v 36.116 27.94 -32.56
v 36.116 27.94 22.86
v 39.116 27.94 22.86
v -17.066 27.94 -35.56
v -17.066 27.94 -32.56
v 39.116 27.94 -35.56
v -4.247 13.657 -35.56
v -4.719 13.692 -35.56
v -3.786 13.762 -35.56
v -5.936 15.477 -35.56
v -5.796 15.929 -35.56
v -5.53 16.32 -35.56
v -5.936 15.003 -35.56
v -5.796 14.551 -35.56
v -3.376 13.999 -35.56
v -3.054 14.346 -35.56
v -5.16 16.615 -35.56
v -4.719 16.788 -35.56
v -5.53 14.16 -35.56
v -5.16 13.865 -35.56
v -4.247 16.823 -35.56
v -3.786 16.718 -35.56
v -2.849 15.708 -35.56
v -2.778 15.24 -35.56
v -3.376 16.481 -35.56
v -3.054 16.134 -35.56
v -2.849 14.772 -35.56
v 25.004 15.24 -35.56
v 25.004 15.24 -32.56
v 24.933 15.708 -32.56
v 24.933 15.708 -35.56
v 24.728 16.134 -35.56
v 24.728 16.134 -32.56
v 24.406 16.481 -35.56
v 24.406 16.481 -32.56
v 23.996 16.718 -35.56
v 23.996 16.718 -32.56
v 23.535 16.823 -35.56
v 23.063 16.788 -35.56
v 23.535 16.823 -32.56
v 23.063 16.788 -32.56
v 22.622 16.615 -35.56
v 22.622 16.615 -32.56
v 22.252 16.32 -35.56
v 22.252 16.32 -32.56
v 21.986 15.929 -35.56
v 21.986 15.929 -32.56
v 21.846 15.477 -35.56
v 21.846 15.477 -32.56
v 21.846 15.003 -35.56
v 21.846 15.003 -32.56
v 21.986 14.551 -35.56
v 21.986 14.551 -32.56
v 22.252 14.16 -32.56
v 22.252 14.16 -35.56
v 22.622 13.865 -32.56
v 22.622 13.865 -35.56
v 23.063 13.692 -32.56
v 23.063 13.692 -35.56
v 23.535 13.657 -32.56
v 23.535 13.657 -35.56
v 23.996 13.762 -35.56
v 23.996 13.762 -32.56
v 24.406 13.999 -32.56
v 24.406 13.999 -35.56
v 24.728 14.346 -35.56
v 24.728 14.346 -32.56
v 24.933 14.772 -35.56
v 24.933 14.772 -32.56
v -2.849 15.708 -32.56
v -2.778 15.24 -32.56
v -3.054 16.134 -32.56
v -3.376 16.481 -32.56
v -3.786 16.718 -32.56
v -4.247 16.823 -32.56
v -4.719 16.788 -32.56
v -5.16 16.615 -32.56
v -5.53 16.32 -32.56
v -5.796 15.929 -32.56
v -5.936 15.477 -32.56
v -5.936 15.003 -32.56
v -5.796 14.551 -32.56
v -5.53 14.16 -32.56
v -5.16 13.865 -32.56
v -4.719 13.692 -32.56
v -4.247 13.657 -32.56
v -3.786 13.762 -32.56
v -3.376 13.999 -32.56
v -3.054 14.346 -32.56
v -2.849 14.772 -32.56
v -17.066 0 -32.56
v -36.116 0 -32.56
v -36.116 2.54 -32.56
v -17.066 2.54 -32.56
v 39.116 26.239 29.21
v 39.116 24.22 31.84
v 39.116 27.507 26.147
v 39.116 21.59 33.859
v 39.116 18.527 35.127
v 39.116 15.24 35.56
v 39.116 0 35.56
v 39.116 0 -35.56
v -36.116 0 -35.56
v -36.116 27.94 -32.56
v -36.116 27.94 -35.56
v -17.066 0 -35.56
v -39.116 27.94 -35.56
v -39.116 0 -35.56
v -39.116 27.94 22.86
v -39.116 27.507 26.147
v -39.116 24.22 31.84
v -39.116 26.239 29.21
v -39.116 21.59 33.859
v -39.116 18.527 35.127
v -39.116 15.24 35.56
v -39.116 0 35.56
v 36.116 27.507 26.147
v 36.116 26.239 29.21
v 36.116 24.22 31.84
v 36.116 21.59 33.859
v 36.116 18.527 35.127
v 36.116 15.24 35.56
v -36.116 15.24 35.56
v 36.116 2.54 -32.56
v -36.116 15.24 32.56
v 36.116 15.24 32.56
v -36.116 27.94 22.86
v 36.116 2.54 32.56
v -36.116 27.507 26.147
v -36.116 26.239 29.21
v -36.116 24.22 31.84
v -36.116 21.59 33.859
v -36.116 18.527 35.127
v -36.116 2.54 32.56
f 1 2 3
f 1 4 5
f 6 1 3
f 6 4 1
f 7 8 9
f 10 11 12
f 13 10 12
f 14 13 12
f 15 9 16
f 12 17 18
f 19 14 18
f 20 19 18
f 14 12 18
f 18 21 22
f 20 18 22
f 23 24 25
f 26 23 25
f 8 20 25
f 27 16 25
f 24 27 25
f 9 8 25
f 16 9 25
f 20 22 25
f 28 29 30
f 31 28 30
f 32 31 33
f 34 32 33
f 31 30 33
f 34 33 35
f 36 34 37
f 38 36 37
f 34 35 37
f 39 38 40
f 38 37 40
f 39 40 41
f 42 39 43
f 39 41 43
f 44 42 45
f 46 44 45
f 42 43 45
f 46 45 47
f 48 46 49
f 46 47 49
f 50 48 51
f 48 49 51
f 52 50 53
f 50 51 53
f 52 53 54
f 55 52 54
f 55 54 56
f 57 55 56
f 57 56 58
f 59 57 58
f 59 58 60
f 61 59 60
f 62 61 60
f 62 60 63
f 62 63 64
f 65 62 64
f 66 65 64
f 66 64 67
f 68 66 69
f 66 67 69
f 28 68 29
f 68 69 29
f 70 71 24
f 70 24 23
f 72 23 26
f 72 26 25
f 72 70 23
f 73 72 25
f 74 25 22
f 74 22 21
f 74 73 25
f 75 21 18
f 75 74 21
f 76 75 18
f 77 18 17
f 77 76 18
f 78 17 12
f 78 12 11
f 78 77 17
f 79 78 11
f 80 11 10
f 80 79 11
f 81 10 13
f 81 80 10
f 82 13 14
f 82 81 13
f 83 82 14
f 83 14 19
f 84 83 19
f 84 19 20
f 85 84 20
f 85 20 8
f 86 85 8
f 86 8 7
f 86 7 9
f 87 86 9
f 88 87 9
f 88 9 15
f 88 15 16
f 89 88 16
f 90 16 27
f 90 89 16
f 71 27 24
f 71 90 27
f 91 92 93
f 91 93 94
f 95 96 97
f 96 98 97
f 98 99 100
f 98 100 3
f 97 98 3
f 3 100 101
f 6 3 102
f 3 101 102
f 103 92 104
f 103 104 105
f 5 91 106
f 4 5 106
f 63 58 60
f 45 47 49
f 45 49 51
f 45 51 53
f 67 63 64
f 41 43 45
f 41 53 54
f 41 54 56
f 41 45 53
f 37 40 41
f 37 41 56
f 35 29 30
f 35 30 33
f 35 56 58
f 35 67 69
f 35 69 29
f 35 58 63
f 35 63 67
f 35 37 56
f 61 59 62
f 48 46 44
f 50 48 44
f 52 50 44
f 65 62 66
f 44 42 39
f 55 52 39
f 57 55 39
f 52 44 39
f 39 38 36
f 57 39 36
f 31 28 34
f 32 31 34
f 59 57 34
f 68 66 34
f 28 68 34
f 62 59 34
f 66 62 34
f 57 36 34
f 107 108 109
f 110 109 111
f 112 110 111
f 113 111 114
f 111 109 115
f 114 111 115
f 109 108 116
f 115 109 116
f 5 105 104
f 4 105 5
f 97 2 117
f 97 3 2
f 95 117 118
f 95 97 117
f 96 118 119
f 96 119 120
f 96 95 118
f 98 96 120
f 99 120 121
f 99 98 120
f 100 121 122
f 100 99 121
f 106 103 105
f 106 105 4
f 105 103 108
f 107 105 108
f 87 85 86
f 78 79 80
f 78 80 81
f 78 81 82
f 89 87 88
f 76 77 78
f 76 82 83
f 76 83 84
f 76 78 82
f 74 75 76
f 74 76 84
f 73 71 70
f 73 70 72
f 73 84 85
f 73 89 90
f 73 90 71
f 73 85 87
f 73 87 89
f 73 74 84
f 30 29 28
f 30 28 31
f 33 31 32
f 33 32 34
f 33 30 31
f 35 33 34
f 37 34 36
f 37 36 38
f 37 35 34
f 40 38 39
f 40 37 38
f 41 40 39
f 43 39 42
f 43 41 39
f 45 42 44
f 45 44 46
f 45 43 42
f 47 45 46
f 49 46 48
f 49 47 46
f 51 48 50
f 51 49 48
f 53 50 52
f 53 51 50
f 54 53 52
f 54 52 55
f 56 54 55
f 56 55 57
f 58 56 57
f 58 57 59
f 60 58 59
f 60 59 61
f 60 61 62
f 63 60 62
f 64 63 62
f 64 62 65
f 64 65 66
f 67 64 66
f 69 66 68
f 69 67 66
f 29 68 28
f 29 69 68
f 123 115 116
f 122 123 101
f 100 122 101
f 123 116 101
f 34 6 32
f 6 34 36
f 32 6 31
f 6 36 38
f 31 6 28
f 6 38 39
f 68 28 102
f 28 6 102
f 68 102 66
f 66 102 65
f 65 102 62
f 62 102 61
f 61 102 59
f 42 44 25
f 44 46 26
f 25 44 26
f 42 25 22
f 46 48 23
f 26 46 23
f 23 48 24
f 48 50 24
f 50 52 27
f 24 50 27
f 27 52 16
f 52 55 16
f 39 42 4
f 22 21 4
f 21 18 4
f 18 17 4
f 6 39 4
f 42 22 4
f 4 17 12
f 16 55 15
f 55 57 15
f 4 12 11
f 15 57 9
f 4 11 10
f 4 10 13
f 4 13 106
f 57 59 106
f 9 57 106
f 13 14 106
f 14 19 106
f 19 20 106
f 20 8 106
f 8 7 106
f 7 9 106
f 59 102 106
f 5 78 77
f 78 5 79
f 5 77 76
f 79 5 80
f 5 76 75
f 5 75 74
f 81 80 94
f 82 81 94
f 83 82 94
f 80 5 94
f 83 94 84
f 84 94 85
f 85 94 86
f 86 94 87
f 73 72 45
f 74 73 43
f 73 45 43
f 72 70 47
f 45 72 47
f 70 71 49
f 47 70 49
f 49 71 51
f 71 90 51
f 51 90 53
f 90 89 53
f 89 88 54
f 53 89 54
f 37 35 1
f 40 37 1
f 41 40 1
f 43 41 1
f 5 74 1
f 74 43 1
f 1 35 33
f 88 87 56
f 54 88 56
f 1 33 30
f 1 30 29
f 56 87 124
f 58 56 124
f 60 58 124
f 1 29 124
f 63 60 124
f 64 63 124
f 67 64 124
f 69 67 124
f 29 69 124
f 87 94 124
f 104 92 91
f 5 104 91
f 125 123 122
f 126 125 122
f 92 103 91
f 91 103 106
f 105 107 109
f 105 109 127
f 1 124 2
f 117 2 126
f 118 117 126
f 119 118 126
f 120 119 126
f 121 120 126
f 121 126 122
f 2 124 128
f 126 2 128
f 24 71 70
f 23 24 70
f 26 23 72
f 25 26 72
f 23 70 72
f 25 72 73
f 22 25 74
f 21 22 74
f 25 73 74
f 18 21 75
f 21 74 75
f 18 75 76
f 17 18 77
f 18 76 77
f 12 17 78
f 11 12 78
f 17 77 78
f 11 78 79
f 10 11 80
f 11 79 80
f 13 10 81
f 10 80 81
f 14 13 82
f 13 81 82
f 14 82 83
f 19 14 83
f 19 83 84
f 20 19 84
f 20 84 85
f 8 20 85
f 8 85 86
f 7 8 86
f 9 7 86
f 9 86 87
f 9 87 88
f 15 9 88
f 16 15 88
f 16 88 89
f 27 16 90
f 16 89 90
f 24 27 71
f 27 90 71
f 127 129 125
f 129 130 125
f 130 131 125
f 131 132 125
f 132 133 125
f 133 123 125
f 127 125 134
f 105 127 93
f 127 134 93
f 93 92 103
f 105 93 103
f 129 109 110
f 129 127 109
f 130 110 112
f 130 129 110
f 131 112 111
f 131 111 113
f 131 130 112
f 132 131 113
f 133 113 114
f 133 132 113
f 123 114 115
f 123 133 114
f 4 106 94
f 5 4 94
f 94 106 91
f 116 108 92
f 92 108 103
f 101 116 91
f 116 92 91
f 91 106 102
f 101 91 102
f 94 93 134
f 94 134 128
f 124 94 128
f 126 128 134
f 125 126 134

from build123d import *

# Parameters (mm, degrees)
SKETCH1_W             = 72.232
SKETCH1_H             = 65.12
BOSS_EXTRUDE1_DEPTH   = 2.54
BOSS_EXTRUDE2_DEPTH   = 27.94
SKETCH1_4_W           = 19.05
SKETCH1_4_H           = 3
BOSS_EXTRUDE3_DEPTH   = 27.94
SKETCH2_W             = 72.232
SKETCH2_H             = 12.7
CUT_EXTRUDE1_DEPTH    = 27.94
FILLET1_R             = 12.7
SKETCH3_R             = 1.5875
CUT_EXTRUDE2_DEPTH    = 3
SKETCH3_2_R           = 1.5875
BOSS_EXTRUDE4_DEPTH   = 3
BOSS_EXTRUDE4_2_DEPTH = 3


with BuildPart() as part:
    # Sketch1 → Boss-Extrude1 (new body)
    with BuildSketch(Plane(origin=(0, 0, 0), x_dir=(1, 0, 0), z_dir=(0, 1, 0))):
        Rectangle(SKETCH1_W, SKETCH1_H)
    extrude(amount=BOSS_EXTRUDE1_DEPTH)

    # Sketch1<3> → Boss-Extrude2 (add)
    with BuildSketch(Plane(origin=(0, 0, 0), x_dir=(1, 0, 0), z_dir=(0, 1, 0))):
        Polygon((-36.116, -32.56), (-36.116, 32.56), (-36.116, 35.56), (-39.116, 35.56), (-39.116, -35.56), (39.116, -35.56), (39.116, 35.56), (-17.066, 35.56), (-17.066, 32.56), (36.116, 32.56), (36.116, -32.56), align=None)
    extrude(amount=BOSS_EXTRUDE2_DEPTH)

    # Sketch2 → Cut-Extrude1 (cut)
    with BuildSketch(Plane.XY.offset(35.56)):
        with Locations((0, 21.59)):
            Rectangle(SKETCH2_W, SKETCH2_H)
    extrude(amount=-CUT_EXTRUDE1_DEPTH, mode=Mode.SUBTRACT)

    # Fillet1
    fillet1_edges = [part.edges().sort_by_distance(p)[0] for p in [
        (-37.616, 27.94, 35.56),
        (37.616, 27.94, 35.56),
    ]]
    fillet(fillet1_edges, radius=FILLET1_R)

    # Sketch3 → Cut-Extrude2 (cut)
    with BuildSketch(Plane.XY.offset(-32.56)):
        with Locations((23.416, 15.24)):
            Circle(SKETCH3_R)
        with Locations((-4.366, 15.24)):
            Circle(SKETCH3_R)
    extrude(amount=-CUT_EXTRUDE2_DEPTH, mode=Mode.SUBTRACT)


with BuildPart() as body_2:
    # Sketch1<4> → Boss-Extrude3 (new body)
    with BuildSketch(Plane(origin=(0, 0, 0), x_dir=(1, 0, 0), z_dir=(0, 1, 0))):
        with Locations((-26.591, 34.06)):
            Rectangle(SKETCH1_4_W, SKETCH1_4_H)
    extrude(amount=BOSS_EXTRUDE3_DEPTH)


with BuildPart() as body_3:
    # Sketch3<2> → Boss-Extrude4 (new body)
    with BuildSketch(Plane.XY.offset(-32.56)):
        with Locations((23.416, 15.24)):
            Circle(SKETCH3_2_R)
    extrude(amount=-BOSS_EXTRUDE4_DEPTH)


with BuildPart() as body_4:
    # Sketch3<2> → Boss-Extrude4 2 (new body)
    with BuildSketch(Plane.XY.offset(-32.56)):
        with Locations((-4.366, 15.24)):
            Circle(SKETCH3_2_R)
    extrude(amount=-BOSS_EXTRUDE4_2_DEPTH)


solid = Compound([part.part, body_2.part, body_3.part, body_4.part])
